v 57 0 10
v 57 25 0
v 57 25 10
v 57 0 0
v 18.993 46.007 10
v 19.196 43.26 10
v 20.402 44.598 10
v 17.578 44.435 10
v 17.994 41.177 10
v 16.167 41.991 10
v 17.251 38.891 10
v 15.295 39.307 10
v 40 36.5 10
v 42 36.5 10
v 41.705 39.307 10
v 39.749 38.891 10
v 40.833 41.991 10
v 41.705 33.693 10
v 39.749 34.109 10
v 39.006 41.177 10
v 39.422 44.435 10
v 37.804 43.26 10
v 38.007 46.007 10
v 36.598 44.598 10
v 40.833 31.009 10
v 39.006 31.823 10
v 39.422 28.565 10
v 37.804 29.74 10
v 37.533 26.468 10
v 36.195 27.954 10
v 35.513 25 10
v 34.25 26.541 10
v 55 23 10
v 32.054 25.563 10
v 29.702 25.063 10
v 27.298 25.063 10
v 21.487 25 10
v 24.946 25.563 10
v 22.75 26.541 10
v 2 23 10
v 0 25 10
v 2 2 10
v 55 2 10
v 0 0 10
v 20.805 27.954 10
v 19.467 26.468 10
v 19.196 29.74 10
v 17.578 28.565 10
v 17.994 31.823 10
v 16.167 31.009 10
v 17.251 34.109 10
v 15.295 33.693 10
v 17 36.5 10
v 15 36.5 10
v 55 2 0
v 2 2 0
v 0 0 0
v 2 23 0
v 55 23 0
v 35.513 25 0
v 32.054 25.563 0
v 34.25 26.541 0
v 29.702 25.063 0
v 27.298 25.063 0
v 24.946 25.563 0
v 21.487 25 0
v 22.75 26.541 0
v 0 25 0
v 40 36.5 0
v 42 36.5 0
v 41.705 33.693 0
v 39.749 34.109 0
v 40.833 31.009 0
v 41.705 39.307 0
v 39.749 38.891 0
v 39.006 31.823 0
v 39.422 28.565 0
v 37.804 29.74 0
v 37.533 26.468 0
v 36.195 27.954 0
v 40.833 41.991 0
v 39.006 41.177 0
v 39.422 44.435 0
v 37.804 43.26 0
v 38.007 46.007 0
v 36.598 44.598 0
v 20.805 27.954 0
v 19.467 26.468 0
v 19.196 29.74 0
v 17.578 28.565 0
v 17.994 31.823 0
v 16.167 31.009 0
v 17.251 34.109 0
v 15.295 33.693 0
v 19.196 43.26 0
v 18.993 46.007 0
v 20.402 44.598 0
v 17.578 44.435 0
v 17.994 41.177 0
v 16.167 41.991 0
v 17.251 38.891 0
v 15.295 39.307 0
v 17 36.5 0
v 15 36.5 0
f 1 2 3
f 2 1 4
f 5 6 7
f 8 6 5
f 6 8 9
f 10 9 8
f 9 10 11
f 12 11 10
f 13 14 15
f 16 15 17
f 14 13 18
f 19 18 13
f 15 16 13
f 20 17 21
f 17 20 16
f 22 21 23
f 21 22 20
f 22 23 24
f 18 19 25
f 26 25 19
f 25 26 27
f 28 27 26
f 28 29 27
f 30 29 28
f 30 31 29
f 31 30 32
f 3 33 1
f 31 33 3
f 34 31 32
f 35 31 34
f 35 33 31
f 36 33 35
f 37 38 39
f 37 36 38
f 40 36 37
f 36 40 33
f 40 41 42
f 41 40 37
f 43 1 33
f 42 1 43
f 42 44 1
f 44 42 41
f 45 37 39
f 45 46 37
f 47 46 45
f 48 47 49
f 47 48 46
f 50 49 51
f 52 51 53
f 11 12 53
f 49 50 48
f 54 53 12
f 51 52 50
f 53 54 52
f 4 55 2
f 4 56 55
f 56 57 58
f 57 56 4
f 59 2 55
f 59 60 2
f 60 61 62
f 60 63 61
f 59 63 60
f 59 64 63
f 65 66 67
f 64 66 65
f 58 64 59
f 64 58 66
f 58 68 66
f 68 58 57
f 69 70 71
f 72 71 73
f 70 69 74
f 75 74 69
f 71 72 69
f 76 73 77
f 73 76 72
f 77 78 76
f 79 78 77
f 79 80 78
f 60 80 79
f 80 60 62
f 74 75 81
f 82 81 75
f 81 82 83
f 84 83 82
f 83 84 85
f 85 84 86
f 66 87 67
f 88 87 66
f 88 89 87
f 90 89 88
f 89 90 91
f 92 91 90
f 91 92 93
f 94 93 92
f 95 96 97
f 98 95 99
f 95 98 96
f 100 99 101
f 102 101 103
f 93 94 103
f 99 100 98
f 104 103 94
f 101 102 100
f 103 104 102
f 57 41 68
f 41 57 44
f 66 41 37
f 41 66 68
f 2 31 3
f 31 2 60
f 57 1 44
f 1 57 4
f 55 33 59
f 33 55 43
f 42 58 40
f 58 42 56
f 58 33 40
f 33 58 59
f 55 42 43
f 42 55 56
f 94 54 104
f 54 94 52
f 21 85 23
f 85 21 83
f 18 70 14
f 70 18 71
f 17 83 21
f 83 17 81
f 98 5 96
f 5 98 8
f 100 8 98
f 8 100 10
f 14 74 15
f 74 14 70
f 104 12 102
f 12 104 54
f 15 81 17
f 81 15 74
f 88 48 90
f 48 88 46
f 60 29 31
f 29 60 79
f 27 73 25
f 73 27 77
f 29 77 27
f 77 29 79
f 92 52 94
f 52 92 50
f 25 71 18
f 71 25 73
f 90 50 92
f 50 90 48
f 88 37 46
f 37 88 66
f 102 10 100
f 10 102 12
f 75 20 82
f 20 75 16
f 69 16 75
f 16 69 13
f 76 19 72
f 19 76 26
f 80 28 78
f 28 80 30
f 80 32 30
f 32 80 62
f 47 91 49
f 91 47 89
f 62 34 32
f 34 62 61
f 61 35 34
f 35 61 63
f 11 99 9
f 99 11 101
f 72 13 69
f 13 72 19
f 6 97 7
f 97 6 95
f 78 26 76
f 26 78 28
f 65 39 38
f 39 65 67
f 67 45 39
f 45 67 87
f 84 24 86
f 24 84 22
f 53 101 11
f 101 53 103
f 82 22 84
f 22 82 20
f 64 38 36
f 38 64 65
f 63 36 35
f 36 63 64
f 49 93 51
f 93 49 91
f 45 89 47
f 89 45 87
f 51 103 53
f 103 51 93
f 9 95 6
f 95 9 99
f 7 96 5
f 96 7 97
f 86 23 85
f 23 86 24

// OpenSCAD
wiiSensorBarWidth=53;
wiiSensorBarHeight=21;
projectionScreenBarDiameter=23;
wallThickness=2;
partThickness=10;

union()
{
outerCubeWidth = wiiSensorBarWidth + wallThickness * 2;
outerCubeHeight = wiiSensorBarHeight + wallThickness * 2;

difference()
{
cube([outerCubeWidth, outerCubeHeight, partThickness]);
translate([wallThickness, wallThickness, -1])
cube([wiiSensorBarWidth, wiiSensorBarHeight, partThickness + 2]);
}

difference()
{
outerRadius = (projectionScreenBarDiameter + wallThickness * 2) / 2;
innerRadius = projectionScreenBarDiameter / 2;

translate([outerCubeWidth / 2, outerCubeHeight + innerRadius, 0])
difference()
{
cylinder(r=outerRadius, partThickness);
translate([0, 0, -1])
cylinder(r=innerRadius, partThickness + 2);
}

translate([outerCubeWidth / 2, outerCubeHeight + innerRadius, -1])
rotate([0, 0, 45])
cube([outerRadius+1, outerRadius+1, partThickness + 2]);
}
}
